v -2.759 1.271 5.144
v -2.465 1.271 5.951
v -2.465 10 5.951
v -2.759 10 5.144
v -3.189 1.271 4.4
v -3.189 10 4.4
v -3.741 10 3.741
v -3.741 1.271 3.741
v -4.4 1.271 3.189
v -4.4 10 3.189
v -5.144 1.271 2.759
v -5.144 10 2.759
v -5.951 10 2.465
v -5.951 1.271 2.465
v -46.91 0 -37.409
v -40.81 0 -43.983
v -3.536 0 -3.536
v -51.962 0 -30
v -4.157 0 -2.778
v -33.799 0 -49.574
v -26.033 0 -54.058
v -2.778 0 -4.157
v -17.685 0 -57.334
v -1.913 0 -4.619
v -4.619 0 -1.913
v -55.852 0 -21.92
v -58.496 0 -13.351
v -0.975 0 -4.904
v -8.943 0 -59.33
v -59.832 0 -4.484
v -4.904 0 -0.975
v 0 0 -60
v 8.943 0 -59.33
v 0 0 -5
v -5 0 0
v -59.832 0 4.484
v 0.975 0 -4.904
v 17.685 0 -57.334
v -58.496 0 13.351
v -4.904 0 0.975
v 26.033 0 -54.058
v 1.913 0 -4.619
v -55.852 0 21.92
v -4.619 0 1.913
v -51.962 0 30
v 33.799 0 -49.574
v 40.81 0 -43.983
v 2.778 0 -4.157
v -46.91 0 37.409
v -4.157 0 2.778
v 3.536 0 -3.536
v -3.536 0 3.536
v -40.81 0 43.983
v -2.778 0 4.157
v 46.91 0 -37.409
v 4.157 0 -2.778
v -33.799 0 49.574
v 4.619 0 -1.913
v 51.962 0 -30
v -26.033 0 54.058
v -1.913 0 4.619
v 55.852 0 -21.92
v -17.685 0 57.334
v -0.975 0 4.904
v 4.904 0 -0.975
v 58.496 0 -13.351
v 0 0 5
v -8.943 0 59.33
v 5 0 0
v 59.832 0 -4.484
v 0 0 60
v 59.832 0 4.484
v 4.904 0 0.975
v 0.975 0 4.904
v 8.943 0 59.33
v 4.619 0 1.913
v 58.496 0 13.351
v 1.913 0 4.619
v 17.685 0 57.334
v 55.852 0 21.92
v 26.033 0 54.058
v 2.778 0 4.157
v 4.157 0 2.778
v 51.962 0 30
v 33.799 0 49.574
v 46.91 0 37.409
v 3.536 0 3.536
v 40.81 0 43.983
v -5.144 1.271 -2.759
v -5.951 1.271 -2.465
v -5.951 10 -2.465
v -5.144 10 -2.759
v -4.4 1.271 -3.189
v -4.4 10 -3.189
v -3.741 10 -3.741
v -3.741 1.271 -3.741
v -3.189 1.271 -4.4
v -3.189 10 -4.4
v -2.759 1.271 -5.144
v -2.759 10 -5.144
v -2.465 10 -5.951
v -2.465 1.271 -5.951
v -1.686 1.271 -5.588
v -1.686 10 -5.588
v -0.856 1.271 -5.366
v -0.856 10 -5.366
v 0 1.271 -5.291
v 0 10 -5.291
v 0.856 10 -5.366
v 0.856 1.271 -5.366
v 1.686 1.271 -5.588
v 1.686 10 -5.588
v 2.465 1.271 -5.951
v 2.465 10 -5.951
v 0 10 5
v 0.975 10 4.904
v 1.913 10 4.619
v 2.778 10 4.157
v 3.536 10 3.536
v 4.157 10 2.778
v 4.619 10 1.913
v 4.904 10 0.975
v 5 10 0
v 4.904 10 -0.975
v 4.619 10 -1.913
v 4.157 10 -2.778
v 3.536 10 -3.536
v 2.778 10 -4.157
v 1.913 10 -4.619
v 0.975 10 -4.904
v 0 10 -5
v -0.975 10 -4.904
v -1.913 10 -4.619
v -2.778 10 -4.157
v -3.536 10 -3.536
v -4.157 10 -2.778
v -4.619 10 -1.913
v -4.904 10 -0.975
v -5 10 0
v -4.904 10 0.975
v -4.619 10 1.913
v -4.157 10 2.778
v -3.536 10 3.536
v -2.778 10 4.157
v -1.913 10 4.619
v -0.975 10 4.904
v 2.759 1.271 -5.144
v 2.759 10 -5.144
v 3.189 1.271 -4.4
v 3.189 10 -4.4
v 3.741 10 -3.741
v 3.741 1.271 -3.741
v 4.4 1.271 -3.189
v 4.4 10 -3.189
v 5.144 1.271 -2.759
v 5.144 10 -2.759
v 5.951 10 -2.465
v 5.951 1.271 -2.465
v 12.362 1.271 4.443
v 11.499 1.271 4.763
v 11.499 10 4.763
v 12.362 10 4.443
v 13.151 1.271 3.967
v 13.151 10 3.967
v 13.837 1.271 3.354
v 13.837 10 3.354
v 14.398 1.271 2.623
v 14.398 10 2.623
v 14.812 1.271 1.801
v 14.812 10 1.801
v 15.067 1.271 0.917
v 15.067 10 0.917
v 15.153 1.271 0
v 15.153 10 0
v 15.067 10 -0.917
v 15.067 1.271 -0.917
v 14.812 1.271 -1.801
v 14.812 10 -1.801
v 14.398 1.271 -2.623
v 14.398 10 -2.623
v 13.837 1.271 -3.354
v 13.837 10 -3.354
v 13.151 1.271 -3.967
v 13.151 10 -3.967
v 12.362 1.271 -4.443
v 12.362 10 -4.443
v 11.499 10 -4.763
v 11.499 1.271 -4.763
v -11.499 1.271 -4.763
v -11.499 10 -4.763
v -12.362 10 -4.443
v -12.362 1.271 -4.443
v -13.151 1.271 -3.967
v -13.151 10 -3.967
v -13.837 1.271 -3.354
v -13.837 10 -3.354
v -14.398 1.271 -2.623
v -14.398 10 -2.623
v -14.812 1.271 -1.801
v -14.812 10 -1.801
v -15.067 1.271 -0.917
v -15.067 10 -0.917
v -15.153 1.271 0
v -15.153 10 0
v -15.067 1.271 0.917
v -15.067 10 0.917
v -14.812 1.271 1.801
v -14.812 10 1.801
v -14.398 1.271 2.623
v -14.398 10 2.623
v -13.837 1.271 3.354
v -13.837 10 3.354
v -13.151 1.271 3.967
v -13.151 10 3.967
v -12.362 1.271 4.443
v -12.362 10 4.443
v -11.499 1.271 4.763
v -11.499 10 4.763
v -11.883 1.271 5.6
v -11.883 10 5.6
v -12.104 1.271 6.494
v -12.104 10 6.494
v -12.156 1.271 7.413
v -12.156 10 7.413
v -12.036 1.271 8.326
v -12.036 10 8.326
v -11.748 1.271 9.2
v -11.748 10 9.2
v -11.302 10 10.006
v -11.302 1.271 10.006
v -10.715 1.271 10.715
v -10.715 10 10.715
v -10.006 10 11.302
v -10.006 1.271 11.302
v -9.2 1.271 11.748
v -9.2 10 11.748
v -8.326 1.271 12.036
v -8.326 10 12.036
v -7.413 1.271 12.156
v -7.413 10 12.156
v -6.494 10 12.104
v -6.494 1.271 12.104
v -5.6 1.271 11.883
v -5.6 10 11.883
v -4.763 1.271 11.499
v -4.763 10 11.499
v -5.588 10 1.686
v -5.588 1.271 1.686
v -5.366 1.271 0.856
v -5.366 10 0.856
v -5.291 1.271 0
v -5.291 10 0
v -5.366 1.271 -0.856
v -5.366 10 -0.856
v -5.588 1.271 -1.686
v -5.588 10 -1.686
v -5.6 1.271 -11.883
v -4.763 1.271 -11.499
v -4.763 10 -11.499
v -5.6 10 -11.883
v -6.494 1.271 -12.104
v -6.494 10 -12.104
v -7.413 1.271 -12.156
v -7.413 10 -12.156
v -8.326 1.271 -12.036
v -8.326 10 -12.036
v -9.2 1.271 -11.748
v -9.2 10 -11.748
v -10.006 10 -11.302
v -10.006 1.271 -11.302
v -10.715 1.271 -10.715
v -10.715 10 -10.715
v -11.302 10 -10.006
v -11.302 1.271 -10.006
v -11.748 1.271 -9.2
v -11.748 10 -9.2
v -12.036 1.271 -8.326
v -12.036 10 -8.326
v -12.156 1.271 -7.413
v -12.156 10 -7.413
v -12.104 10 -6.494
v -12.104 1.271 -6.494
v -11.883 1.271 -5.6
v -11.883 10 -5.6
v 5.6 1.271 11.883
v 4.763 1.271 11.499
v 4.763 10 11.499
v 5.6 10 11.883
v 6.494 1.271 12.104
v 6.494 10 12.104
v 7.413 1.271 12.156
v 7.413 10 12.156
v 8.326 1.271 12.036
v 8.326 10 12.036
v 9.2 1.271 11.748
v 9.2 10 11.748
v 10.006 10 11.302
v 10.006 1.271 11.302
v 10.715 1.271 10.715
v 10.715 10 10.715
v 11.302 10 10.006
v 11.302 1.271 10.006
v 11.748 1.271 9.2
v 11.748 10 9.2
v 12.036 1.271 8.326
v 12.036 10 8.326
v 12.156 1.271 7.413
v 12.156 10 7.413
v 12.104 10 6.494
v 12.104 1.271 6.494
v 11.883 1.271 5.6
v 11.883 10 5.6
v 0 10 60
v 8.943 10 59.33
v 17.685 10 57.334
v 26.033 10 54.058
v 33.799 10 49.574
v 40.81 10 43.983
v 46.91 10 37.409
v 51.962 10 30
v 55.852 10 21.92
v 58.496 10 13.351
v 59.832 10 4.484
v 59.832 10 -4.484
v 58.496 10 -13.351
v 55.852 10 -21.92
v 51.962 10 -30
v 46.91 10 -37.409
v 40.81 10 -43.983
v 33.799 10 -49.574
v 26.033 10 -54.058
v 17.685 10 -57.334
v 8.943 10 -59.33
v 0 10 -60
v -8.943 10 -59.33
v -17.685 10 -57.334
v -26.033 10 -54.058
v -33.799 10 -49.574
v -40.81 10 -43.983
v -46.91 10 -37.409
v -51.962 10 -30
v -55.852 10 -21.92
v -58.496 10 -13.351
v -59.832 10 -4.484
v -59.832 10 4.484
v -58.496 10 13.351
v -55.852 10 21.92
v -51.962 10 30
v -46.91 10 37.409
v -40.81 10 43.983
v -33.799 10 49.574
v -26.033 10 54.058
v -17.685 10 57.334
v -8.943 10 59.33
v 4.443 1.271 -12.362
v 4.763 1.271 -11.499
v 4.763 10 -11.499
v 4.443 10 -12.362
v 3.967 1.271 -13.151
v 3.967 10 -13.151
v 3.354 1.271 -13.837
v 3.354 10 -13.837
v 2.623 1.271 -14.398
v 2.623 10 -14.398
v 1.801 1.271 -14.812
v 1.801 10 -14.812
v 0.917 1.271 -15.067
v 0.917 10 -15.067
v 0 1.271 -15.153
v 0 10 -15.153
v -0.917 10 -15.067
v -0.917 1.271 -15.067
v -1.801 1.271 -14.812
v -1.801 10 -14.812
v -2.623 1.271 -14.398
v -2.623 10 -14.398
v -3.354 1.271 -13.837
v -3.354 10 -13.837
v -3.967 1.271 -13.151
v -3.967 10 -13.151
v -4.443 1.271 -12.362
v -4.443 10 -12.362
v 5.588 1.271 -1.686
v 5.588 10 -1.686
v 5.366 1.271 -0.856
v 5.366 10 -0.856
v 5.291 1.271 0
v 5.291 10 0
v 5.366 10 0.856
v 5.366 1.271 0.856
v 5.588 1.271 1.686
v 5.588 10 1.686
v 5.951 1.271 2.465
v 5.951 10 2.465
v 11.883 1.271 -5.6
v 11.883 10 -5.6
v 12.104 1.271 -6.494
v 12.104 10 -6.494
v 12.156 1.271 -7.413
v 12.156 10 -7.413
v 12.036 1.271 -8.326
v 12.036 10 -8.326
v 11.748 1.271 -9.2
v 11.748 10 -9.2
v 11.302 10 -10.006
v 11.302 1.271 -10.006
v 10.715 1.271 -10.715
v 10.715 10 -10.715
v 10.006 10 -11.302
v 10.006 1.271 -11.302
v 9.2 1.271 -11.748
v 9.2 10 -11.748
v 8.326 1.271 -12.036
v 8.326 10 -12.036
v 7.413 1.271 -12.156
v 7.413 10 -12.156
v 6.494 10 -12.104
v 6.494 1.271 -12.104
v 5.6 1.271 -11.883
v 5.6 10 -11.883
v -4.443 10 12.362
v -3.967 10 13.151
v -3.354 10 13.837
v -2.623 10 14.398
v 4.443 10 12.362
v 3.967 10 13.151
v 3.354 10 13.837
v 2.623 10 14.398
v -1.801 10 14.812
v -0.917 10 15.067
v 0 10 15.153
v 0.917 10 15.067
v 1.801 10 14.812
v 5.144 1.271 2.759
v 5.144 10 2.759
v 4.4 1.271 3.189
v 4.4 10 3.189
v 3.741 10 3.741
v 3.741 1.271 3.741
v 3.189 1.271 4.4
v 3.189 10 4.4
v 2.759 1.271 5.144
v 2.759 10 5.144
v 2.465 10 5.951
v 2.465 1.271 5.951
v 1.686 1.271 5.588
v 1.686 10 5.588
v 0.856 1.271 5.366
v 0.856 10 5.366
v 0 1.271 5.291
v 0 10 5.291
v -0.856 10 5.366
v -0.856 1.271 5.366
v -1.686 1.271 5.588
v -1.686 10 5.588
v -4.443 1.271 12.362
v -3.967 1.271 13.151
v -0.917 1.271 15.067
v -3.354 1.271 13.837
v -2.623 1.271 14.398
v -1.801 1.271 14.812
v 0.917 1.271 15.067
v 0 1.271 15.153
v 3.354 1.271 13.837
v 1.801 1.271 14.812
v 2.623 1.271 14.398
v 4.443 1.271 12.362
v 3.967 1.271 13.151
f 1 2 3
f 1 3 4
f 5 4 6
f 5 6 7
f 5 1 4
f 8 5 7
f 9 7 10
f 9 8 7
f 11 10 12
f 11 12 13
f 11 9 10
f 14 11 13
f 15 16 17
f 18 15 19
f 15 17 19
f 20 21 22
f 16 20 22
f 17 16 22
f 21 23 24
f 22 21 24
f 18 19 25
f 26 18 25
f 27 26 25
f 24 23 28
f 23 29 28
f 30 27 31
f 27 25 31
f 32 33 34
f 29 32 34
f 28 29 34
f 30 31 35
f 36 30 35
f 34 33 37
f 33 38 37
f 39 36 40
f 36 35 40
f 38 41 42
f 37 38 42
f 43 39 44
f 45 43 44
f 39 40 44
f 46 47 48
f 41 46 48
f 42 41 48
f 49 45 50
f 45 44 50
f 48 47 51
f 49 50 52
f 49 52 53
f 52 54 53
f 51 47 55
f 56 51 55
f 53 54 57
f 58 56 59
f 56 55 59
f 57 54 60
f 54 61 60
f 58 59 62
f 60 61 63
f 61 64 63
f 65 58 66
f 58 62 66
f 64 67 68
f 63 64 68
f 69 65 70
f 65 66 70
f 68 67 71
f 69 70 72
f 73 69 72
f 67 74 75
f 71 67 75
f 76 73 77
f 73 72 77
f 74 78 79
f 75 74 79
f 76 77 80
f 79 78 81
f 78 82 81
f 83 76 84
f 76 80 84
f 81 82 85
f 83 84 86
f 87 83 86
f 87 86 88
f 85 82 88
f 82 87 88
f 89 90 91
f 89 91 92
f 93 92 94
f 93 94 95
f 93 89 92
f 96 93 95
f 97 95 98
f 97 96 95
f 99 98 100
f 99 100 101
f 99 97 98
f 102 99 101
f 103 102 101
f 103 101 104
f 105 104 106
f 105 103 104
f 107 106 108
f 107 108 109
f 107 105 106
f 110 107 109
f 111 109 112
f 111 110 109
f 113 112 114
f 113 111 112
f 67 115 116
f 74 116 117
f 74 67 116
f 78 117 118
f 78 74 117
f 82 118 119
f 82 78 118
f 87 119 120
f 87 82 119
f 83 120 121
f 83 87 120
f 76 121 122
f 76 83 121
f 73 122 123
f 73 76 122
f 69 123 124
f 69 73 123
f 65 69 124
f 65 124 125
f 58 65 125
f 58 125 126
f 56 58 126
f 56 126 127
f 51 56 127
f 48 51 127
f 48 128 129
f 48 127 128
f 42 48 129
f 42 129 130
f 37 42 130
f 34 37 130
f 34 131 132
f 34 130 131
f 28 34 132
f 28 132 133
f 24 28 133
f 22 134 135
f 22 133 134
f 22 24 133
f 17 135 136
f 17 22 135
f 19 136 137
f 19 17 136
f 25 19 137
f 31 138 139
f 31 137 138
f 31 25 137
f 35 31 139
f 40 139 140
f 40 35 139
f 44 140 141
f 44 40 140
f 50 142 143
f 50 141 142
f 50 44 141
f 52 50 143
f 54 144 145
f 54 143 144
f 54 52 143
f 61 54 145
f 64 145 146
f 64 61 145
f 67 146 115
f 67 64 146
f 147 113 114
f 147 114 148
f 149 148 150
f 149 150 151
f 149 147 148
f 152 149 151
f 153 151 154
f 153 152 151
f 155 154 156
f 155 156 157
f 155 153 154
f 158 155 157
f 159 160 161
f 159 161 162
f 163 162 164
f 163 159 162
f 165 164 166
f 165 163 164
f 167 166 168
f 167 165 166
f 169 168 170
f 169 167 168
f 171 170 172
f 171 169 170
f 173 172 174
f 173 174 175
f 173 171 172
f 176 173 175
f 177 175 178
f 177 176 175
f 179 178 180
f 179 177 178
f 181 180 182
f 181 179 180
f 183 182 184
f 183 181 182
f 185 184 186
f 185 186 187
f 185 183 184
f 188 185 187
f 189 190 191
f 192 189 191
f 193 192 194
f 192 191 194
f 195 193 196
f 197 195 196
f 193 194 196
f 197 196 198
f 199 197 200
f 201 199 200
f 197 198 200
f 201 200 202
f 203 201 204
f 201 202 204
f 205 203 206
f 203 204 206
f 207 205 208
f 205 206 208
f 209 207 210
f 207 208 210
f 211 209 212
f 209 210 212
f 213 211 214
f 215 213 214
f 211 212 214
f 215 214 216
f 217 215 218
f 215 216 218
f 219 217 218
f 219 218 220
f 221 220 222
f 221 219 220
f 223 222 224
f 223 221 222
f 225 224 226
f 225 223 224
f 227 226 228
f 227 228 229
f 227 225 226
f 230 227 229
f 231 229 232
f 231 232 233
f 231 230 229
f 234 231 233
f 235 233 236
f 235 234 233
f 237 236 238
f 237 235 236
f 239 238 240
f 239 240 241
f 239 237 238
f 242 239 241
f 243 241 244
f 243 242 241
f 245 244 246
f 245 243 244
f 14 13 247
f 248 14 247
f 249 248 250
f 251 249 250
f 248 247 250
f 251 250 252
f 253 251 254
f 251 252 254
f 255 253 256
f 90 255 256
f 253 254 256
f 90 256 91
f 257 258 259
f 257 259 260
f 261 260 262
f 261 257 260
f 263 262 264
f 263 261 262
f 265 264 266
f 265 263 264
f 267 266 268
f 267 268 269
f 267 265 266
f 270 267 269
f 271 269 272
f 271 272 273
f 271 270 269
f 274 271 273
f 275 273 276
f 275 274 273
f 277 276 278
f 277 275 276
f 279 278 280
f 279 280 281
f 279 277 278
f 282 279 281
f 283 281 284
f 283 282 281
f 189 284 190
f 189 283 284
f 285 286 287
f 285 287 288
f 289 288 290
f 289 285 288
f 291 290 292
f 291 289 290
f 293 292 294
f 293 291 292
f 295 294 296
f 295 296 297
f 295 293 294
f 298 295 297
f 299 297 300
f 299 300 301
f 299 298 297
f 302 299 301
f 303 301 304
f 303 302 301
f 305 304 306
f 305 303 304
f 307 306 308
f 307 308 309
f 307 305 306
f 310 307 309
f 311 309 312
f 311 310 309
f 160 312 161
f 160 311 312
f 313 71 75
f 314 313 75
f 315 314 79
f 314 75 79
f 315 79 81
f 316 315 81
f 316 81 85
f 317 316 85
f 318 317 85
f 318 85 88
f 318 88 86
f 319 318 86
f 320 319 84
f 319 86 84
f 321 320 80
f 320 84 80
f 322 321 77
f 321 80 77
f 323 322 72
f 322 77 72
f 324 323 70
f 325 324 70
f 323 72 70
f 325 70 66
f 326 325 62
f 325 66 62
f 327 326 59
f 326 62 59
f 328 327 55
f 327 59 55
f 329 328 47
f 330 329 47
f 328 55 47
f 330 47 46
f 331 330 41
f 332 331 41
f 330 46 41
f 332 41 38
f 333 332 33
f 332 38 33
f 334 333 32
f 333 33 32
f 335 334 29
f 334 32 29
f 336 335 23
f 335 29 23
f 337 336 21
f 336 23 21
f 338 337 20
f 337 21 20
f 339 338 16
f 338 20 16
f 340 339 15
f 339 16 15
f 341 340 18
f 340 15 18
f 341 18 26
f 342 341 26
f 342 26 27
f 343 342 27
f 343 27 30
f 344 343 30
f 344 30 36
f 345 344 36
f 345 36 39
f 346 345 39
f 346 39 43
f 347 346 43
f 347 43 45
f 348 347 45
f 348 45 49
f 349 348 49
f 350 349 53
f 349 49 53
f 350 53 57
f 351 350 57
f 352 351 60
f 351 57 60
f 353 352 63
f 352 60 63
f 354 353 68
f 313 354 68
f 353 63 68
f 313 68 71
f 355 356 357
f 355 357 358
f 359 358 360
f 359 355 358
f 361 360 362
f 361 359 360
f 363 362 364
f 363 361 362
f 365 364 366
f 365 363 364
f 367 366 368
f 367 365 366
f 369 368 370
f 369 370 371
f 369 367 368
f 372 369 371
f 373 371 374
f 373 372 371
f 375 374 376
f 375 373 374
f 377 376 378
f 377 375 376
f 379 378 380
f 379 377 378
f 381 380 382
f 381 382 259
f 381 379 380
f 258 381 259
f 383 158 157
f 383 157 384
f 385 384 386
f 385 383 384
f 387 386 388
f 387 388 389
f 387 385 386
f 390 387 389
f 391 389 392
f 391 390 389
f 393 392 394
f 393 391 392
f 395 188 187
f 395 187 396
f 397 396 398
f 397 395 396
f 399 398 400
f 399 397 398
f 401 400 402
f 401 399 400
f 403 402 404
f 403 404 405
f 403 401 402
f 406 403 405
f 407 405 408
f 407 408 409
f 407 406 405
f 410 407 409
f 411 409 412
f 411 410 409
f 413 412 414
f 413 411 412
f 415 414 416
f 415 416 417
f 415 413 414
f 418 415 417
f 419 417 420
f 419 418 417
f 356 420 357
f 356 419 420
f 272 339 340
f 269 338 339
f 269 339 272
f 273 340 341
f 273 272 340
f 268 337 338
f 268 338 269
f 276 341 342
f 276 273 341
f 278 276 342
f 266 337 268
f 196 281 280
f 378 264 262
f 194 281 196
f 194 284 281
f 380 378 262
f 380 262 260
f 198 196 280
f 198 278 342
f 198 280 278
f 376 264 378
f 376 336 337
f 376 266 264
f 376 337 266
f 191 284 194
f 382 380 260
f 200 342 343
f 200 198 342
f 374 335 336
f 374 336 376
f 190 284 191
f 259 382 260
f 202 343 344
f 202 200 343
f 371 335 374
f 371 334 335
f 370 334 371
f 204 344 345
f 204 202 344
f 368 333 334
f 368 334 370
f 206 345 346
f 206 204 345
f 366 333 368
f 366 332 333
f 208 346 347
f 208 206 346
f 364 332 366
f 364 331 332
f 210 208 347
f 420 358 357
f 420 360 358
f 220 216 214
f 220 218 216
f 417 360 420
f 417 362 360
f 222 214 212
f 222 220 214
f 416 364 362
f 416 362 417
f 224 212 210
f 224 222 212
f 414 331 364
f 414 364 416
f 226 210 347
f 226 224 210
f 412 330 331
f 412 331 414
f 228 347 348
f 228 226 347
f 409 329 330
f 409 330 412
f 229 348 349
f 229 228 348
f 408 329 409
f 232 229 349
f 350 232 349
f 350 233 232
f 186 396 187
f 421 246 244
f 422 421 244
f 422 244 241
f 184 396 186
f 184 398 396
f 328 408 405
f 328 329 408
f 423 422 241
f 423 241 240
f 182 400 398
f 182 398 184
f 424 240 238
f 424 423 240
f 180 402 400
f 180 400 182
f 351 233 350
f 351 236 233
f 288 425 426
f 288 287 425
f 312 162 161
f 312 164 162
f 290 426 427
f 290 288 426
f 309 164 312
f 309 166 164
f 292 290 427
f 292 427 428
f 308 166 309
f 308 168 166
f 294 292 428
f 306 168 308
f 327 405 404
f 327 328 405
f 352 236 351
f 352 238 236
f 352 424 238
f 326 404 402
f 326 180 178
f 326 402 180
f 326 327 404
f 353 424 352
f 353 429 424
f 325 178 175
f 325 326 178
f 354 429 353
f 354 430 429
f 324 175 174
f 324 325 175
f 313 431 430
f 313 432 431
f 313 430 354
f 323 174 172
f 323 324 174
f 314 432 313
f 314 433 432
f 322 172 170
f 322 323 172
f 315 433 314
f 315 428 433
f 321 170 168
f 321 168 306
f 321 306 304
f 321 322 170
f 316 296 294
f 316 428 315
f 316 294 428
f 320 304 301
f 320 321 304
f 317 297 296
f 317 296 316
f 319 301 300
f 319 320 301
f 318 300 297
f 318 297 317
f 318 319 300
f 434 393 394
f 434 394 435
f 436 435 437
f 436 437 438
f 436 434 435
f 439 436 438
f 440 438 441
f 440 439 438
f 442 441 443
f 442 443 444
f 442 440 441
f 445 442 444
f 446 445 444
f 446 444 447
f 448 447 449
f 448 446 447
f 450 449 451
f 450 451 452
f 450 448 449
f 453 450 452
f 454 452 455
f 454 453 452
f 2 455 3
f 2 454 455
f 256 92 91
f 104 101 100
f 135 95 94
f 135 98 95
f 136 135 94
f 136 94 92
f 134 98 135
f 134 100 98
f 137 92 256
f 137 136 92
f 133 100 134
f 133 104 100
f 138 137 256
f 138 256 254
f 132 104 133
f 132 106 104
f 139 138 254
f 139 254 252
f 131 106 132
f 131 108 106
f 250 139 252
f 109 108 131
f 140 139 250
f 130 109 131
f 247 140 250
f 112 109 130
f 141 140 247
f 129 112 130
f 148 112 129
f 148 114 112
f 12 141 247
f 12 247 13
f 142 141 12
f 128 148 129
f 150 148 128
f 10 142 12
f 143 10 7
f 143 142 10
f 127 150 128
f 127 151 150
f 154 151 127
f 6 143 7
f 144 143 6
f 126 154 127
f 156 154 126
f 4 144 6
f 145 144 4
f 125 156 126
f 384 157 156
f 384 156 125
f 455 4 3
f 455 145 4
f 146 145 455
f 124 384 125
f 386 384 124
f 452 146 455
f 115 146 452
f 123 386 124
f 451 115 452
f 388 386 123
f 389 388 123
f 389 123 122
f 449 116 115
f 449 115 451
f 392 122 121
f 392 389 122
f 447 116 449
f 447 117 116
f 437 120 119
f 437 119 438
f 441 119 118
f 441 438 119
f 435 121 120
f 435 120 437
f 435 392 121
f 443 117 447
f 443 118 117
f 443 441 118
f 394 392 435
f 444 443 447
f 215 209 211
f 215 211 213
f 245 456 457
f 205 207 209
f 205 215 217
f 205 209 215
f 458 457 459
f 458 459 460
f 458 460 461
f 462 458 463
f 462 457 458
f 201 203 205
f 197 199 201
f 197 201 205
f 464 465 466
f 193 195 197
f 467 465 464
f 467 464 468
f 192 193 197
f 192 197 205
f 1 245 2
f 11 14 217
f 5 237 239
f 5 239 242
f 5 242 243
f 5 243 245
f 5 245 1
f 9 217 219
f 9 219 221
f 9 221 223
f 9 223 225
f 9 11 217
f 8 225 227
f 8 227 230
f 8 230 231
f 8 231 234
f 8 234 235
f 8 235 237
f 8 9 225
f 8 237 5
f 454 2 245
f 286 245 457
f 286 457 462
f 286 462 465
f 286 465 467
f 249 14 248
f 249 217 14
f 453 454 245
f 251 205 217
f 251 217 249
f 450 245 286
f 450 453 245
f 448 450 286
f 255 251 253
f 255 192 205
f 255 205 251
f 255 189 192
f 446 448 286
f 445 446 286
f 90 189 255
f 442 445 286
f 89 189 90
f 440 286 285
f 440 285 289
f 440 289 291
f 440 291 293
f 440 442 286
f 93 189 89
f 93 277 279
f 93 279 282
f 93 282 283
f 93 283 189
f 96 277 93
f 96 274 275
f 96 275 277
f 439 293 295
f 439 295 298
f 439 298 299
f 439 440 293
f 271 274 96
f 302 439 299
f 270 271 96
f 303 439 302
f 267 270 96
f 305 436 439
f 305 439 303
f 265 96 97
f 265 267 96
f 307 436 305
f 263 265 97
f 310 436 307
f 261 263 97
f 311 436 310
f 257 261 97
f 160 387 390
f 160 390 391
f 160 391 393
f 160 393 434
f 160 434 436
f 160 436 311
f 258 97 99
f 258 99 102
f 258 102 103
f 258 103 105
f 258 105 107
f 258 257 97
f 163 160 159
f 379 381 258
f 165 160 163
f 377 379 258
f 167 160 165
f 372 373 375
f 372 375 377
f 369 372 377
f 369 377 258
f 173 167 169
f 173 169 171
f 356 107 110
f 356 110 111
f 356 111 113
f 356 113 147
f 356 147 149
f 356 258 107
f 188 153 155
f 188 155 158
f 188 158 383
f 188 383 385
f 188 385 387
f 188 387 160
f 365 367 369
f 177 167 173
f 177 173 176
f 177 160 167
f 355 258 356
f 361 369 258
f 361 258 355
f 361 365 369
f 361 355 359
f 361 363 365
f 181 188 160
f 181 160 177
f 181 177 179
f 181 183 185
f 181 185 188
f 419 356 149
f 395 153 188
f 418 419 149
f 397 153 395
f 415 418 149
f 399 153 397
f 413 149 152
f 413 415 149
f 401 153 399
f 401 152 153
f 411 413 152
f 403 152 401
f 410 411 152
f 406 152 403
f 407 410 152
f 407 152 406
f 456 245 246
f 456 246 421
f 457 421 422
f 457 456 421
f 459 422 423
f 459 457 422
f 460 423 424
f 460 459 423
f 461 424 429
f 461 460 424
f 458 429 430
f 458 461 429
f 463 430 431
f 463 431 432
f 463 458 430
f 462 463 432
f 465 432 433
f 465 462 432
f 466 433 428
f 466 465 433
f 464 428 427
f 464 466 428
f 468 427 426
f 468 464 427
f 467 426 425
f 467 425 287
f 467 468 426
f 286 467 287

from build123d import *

# Parameters (mm, degrees)
SKETCH1_R           = 60
BOSS_EXTRUDE1_DEPTH = 10
SKETCH2_R           = 5
CUT_EXTRUDE1_DEPTH  = 86.440037453
SKETCH3_R           = 4.931187375
CUT_EXTRUDE2_DEPTH  = 8.729105942
CIRPATTERN1_COUNT   = 8


with BuildPart() as part:
    # Sketch1 → Boss-Extrude1 (new body)
    with BuildSketch(Plane(origin=(0, 0, 0), x_dir=(1, 0, 0), z_dir=(0, 1, 0))):
        Circle(SKETCH1_R)
    extrude(amount=BOSS_EXTRUDE1_DEPTH)

    # Sketch2 → Cut-Extrude1 (cut, through all)
    with BuildSketch(Plane(origin=(0, 0, 0), x_dir=(1, 0, 0), z_dir=(0, 1, 0))):
        Circle(SKETCH2_R)
    extrude(amount=CUT_EXTRUDE1_DEPTH, mode=Mode.SUBTRACT)

    # Sketch3 → Cut-Extrude2 (cut)
    with BuildSketch(Plane(origin=(0, 10, 0), x_dir=(1, 0, 0), z_dir=(0, 1, 0))):
        with Locations((-10.222069231, 0)):
            Circle(SKETCH3_R)
    cut_extrude2 = extrude(amount=-CUT_EXTRUDE2_DEPTH, mode=Mode.SUBTRACT)

    # CirPattern1: Cut-Extrude2 ×8 about axis
    cirpattern1_axis = Axis((0, 0, 0), (0, 1, 0))
    for i in range(1, CIRPATTERN1_COUNT):
        add(cut_extrude2.rotate(cirpattern1_axis, i * 360 / CIRPATTERN1_COUNT), mode=Mode.SUBTRACT)


solid = part.part
